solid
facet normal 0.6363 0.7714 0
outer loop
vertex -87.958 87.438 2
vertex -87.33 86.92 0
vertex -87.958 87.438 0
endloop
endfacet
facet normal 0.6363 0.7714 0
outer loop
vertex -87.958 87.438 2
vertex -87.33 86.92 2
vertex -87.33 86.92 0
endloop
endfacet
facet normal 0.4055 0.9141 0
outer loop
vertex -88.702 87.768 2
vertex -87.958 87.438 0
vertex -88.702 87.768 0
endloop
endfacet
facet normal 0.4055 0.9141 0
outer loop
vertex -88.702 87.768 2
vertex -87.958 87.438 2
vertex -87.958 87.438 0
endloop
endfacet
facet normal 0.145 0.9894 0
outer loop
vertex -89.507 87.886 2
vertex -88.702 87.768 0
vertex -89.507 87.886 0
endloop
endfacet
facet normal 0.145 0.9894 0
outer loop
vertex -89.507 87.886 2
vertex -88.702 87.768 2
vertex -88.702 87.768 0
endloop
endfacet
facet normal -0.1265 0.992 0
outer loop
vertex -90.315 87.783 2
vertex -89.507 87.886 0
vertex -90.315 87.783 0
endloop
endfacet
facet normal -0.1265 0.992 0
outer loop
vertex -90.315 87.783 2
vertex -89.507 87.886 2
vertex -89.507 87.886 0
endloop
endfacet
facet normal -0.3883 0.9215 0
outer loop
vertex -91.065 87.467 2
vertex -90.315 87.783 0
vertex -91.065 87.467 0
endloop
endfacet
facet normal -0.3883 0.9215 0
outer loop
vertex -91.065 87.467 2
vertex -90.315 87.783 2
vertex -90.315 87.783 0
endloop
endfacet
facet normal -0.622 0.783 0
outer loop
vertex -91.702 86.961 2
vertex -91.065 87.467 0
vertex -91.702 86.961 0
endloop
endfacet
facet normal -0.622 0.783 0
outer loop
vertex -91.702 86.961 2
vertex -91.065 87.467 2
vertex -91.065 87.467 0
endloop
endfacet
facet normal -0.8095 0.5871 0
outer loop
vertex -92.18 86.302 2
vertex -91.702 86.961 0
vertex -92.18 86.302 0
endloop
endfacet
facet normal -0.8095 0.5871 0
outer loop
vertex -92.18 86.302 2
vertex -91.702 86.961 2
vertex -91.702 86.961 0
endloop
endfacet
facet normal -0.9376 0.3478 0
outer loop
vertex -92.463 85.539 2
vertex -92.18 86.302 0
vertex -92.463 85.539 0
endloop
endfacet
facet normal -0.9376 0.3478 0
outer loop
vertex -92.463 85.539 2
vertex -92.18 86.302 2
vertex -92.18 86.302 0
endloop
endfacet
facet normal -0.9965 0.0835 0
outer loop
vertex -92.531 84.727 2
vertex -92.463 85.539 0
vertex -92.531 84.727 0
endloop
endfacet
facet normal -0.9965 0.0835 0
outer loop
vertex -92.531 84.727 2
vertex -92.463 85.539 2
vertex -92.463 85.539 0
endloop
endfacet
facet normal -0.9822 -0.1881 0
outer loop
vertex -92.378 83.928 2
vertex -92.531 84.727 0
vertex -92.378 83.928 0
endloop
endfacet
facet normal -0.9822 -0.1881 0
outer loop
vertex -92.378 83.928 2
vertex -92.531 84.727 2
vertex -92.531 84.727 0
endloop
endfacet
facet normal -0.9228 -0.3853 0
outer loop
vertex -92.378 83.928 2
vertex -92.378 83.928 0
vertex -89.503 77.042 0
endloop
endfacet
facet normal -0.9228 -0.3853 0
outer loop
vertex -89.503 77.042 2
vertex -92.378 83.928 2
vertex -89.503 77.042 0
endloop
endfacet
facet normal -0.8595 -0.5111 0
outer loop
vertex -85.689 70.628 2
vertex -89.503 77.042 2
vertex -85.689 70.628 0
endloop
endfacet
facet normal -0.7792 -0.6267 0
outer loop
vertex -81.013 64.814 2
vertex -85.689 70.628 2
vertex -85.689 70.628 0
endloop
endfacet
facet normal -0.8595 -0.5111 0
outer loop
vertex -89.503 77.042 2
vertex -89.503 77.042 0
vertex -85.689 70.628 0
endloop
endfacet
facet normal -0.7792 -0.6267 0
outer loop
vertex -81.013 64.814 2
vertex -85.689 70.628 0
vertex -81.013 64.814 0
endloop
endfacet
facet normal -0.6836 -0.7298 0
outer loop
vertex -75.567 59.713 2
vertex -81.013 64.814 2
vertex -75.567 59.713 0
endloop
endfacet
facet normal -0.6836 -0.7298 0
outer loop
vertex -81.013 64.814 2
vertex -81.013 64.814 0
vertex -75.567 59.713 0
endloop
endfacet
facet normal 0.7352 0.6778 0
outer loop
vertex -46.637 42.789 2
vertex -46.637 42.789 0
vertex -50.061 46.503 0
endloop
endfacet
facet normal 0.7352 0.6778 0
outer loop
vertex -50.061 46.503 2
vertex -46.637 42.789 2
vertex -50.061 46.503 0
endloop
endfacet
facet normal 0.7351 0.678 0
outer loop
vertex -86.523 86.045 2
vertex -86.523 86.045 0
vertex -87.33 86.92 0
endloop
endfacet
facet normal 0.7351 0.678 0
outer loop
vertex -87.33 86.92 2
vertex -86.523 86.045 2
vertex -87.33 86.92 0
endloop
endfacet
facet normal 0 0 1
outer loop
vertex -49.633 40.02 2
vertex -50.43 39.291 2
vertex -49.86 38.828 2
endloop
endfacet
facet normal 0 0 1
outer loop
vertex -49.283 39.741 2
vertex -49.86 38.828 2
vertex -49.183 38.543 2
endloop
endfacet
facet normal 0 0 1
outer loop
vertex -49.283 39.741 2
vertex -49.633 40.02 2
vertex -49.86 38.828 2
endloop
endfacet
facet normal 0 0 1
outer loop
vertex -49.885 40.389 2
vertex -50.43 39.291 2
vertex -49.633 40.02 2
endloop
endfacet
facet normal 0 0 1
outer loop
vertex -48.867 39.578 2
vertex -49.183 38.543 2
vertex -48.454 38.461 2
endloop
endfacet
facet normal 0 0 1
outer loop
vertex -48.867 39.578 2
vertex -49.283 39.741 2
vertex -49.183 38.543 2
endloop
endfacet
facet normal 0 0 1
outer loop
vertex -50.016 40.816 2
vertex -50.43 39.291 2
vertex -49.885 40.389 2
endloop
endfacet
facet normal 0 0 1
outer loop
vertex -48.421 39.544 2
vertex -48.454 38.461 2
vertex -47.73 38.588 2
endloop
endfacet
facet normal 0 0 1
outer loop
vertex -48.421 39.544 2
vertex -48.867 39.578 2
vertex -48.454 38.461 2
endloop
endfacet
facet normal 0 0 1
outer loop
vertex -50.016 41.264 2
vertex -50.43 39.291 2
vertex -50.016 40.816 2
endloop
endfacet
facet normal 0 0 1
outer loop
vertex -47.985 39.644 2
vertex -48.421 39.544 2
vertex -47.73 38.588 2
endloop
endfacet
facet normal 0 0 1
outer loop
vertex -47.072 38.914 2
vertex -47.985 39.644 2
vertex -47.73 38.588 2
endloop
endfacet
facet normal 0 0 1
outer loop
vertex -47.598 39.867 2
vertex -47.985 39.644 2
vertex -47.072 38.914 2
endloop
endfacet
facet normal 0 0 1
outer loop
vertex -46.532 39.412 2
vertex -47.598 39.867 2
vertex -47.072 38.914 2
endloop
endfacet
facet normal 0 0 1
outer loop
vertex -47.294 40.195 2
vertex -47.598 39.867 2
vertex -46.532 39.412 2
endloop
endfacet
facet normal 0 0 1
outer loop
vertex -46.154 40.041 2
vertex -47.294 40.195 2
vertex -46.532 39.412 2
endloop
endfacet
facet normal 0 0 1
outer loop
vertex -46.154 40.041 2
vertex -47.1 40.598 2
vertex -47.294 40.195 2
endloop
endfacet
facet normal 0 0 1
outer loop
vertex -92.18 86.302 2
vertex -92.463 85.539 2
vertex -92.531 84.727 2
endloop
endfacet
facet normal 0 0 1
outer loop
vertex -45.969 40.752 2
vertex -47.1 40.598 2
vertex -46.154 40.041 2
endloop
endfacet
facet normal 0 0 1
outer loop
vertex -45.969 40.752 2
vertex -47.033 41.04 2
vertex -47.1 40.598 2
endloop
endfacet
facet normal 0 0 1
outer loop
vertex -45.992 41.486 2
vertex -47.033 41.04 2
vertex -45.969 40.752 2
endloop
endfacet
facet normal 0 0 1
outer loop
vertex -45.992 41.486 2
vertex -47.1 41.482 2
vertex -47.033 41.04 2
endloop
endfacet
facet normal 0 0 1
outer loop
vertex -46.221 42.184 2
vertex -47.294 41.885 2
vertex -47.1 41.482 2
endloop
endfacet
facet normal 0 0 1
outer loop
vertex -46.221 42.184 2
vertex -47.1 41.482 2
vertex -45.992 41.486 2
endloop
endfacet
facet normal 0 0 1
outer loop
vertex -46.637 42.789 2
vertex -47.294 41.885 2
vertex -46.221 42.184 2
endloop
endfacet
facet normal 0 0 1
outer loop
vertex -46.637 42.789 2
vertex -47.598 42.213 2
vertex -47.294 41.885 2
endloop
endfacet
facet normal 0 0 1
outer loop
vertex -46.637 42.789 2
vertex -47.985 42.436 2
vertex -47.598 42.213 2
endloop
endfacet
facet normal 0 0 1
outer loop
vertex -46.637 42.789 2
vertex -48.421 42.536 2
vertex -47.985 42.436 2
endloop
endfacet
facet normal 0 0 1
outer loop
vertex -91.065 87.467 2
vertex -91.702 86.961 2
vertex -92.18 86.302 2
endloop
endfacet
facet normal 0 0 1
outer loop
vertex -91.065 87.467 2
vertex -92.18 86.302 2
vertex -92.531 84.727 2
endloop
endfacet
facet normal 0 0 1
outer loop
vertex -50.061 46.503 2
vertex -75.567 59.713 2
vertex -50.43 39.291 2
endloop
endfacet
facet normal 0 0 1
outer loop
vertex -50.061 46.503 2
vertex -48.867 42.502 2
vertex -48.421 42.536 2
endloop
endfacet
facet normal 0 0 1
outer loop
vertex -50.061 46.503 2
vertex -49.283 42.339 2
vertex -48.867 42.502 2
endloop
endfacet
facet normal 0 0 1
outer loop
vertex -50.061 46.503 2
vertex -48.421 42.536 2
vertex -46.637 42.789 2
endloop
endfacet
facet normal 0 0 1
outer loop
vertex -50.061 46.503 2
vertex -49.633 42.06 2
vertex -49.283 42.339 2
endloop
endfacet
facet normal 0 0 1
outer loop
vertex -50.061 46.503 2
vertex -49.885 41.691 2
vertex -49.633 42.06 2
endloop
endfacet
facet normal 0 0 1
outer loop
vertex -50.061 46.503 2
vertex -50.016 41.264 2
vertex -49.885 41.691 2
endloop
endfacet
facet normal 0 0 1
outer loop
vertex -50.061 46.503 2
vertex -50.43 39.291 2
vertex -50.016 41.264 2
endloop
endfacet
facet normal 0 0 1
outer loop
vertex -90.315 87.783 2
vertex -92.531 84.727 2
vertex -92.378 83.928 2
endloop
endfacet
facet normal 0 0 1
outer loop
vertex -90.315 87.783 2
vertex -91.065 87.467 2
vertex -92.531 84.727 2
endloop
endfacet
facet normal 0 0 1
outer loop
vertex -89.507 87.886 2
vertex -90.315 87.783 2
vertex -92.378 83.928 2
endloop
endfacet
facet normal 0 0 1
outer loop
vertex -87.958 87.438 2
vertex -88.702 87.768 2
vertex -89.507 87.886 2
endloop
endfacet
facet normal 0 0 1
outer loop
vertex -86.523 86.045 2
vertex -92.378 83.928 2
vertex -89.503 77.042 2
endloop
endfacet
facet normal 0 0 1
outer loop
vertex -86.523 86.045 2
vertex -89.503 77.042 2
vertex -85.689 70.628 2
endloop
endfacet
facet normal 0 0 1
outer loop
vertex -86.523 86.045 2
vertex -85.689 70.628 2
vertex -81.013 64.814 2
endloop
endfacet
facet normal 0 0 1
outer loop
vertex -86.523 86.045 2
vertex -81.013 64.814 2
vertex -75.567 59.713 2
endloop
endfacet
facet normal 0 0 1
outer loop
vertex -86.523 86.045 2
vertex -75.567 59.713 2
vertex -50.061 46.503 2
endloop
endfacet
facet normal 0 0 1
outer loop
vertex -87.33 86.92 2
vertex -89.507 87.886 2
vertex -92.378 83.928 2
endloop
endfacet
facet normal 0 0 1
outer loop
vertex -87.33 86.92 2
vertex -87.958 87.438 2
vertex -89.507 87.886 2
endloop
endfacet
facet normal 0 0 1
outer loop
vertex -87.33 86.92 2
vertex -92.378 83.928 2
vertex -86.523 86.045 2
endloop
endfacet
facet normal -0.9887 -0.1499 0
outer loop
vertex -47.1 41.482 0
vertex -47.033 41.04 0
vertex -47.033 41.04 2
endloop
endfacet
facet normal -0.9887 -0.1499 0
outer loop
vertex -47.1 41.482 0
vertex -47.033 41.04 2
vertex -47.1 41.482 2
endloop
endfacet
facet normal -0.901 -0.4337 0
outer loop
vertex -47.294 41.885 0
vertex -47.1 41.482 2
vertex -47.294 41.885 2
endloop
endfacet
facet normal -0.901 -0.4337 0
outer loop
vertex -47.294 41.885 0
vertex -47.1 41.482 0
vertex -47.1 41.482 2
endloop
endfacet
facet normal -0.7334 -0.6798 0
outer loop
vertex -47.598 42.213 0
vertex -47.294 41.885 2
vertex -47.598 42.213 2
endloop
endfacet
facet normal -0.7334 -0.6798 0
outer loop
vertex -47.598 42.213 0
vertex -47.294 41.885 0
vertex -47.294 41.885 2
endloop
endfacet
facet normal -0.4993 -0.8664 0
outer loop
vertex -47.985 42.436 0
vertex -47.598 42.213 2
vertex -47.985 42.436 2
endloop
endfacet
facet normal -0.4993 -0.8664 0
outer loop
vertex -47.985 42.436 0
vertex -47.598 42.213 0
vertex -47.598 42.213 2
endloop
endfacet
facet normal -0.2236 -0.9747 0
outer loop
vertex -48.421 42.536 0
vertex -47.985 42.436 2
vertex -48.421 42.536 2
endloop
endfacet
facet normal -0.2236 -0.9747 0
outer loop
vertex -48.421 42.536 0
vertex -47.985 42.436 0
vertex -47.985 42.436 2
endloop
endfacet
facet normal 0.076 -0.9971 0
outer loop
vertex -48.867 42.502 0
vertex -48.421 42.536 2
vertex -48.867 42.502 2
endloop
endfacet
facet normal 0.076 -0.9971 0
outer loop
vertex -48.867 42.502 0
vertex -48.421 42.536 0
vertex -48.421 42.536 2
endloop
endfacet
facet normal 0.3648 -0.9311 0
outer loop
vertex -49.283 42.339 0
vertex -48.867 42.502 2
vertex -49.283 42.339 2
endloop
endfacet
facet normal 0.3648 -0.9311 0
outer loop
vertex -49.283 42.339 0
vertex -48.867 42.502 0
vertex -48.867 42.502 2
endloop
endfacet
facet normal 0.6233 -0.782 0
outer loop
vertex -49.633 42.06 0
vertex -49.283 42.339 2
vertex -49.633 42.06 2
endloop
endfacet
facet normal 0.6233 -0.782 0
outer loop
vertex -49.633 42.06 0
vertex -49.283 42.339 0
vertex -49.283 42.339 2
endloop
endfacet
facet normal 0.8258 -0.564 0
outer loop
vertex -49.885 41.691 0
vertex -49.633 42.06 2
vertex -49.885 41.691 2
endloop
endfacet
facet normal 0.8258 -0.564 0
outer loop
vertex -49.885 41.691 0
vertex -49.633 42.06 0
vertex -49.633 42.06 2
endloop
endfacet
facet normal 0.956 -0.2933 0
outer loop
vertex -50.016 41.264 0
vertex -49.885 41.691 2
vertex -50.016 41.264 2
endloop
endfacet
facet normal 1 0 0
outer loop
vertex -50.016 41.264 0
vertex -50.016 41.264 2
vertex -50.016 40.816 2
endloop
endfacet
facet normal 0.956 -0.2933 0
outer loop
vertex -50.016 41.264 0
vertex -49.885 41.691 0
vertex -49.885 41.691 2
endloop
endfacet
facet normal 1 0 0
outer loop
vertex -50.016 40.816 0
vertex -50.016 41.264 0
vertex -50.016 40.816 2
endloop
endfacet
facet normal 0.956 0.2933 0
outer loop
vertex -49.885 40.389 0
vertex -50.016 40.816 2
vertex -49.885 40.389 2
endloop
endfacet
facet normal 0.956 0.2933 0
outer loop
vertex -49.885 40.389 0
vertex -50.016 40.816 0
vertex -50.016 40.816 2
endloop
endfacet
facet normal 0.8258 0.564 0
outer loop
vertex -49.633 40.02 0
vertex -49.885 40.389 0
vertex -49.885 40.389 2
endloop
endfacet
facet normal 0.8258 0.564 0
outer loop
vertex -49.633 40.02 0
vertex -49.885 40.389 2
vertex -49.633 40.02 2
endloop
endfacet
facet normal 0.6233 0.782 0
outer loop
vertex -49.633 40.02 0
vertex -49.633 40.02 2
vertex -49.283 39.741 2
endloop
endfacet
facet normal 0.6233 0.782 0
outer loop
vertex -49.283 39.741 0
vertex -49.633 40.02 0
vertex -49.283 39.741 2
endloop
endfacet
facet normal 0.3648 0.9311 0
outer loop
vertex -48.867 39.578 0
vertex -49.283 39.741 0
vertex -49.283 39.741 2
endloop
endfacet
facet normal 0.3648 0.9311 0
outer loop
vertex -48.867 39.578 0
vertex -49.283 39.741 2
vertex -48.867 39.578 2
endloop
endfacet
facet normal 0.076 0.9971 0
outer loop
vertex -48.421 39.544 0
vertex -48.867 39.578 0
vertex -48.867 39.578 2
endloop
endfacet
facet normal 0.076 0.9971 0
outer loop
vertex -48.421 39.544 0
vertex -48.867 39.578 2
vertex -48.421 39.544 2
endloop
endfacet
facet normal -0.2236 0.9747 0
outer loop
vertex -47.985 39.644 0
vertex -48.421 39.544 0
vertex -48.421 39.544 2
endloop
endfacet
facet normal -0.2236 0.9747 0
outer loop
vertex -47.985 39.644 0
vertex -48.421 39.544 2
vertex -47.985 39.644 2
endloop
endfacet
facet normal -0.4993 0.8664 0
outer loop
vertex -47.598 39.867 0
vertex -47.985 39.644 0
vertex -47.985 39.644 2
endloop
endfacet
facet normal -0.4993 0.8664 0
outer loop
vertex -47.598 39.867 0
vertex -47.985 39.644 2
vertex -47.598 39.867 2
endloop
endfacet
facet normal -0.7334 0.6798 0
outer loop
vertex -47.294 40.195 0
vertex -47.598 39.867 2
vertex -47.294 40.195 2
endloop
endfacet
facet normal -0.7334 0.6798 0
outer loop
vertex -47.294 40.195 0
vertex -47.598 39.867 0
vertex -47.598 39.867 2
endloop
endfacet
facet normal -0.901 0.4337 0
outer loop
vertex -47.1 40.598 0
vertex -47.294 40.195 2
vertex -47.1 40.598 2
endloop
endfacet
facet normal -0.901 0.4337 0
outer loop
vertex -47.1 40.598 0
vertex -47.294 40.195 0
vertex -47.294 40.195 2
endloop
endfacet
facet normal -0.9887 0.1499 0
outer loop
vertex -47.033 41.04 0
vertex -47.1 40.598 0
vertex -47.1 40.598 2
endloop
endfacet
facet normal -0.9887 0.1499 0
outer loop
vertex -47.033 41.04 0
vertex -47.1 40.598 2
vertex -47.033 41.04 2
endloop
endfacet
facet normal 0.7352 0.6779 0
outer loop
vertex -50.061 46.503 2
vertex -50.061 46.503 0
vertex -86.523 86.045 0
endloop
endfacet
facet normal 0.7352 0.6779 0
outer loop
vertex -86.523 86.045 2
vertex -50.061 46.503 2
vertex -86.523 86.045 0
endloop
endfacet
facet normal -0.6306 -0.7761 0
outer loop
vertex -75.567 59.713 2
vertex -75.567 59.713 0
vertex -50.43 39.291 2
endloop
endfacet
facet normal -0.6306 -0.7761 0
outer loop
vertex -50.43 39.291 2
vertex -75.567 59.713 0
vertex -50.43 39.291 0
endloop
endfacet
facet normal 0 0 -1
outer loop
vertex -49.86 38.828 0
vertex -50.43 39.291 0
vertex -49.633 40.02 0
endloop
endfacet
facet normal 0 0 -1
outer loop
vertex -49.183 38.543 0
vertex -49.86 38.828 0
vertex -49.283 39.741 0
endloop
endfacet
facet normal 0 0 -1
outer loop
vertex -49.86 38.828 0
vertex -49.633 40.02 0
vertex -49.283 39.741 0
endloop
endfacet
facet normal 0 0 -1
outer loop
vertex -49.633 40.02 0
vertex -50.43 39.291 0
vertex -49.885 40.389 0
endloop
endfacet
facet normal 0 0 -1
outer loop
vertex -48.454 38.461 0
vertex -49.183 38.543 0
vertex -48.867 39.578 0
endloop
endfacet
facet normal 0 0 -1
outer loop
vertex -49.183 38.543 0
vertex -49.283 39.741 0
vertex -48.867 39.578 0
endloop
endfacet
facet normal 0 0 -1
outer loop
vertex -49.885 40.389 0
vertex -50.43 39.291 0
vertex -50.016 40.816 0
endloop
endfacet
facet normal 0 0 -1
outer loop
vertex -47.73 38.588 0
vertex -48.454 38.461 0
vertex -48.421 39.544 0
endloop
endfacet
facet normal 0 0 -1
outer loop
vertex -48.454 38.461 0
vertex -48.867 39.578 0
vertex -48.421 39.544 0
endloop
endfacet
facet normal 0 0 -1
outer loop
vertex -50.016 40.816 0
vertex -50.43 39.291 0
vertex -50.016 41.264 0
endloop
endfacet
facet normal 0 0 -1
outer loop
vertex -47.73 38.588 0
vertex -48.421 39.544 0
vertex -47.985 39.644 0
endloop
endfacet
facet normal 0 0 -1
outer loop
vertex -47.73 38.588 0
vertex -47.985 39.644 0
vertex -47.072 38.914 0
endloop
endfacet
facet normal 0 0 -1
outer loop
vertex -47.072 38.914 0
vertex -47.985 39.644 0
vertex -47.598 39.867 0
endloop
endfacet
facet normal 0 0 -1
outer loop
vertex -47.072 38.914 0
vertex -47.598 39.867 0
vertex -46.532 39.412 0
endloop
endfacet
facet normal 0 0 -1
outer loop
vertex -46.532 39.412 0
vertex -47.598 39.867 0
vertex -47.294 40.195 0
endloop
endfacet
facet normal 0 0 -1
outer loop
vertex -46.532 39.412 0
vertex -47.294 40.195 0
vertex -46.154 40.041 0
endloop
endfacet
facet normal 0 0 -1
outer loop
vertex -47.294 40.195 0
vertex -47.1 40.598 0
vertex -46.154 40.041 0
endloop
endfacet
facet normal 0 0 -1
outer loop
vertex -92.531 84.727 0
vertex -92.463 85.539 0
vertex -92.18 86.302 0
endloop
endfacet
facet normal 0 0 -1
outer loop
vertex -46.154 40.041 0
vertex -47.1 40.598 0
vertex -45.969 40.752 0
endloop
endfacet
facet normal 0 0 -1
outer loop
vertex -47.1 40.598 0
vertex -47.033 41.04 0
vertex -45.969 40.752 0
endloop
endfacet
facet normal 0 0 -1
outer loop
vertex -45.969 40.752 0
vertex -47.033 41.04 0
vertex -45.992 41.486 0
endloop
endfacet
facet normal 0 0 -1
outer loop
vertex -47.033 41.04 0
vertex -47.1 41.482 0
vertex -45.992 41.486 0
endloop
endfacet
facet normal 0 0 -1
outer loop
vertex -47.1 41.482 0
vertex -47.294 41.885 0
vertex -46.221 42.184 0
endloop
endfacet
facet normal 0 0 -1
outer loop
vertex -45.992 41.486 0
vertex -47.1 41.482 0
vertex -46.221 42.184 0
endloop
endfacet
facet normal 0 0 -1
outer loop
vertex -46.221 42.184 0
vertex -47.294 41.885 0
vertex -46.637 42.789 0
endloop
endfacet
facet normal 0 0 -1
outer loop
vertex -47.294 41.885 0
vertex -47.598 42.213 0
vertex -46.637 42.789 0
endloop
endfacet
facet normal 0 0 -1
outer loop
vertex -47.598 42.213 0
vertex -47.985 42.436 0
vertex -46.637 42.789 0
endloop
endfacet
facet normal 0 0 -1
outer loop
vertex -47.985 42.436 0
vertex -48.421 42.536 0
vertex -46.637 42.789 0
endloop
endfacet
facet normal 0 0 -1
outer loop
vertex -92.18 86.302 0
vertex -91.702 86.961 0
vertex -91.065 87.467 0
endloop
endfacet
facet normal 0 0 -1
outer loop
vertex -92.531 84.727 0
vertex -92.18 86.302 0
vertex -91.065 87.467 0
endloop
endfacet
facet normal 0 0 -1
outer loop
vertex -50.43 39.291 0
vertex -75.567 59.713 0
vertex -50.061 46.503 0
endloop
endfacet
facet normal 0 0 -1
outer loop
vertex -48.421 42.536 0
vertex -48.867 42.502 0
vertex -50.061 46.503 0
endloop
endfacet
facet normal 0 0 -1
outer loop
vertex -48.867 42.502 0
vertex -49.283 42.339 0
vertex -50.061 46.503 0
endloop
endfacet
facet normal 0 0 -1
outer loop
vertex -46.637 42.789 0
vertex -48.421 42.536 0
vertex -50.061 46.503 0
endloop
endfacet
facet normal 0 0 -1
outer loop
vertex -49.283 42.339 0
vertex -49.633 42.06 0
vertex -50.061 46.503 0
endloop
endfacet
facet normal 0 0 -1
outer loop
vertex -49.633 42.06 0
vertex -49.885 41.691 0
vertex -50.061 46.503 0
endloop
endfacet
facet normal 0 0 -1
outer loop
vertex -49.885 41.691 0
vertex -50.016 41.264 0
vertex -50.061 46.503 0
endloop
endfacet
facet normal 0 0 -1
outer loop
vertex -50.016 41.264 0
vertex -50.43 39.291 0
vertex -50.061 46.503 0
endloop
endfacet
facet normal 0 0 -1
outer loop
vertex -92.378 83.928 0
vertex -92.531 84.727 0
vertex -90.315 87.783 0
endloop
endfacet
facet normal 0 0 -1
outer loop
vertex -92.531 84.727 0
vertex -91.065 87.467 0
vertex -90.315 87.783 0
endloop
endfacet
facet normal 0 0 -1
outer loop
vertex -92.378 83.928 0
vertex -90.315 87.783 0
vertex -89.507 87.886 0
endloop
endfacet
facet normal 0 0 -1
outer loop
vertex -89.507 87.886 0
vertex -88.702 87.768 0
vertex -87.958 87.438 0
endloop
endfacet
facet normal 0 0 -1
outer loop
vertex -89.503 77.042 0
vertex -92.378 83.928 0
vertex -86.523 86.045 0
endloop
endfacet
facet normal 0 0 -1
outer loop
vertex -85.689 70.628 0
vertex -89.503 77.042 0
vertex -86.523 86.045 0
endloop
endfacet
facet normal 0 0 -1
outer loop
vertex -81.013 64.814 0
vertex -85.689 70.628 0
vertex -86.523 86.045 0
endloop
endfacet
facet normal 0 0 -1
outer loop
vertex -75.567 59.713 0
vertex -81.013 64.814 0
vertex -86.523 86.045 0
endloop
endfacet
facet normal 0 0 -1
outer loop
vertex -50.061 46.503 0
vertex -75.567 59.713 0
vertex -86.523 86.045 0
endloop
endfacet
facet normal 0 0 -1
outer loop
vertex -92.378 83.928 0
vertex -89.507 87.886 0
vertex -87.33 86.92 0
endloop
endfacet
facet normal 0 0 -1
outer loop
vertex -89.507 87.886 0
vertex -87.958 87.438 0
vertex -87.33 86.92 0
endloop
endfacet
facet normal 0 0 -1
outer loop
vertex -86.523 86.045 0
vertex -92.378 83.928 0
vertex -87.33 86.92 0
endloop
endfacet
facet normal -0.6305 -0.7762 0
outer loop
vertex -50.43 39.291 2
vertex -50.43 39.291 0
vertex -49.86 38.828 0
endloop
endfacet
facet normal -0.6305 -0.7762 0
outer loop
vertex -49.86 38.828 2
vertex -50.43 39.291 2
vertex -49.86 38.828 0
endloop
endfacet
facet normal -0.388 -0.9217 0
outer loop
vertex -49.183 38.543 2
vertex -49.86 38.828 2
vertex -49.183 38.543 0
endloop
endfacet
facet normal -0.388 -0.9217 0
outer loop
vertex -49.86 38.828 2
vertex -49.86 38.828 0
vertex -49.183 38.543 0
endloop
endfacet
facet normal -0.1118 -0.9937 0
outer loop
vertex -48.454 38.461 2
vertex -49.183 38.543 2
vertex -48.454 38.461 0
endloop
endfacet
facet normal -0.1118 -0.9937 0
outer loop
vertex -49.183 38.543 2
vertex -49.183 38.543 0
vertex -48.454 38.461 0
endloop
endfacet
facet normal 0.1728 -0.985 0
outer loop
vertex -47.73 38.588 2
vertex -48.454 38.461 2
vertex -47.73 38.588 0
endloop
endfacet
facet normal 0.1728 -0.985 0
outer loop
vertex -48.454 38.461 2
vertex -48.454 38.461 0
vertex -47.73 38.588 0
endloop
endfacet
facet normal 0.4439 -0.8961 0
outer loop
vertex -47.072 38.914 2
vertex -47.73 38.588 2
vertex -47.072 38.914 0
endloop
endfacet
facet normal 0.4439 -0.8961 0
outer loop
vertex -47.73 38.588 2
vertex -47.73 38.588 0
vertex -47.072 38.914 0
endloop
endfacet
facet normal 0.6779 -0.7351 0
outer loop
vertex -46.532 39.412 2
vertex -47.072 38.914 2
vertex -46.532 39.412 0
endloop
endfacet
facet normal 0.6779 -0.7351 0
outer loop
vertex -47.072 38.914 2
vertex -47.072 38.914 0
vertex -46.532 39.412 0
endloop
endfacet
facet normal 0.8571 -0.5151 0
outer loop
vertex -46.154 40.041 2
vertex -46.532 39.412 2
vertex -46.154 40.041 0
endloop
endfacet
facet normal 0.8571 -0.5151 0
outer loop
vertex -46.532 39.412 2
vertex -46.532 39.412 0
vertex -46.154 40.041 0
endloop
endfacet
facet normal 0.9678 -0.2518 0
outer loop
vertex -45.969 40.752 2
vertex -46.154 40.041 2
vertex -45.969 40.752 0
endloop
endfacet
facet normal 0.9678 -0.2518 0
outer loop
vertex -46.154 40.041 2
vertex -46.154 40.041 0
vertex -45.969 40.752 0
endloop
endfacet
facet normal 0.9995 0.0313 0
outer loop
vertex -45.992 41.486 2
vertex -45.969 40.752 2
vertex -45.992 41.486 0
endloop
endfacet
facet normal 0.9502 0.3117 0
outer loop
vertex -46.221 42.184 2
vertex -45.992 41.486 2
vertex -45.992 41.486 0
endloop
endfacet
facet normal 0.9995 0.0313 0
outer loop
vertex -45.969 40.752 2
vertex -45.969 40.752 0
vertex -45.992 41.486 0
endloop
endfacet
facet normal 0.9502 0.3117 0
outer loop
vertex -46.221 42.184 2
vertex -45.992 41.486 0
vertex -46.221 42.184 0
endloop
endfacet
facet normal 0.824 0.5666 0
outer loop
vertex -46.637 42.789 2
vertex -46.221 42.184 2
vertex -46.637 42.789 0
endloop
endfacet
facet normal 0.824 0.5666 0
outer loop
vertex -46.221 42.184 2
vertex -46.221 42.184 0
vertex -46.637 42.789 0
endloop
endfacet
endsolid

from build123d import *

# Parameters (mm, degrees)
SKETCH1_R           = 1.5
BOSS_EXTRUDE1_DEPTH = 2
FILLET1_R           = 3


with BuildPart() as part:
    # Sketch1 → Boss-Extrude1 (new body)
    with BuildSketch(Plane.XY):
        with BuildLine():
            Line((-46.636509162, 42.789020236), (-50.060973508, 46.502785938))
            Line((-50.060973508, 46.502785938), (-86.522855439, 86.04499543))
            Line((-86.522855439, 86.04499543), (-94.837872086, 95.062471017))
            ThreePointArc((-94.837872086, 95.062471017), (-88.687933444, 75.487292789), (-75.566721617, 59.712529776))
            Line((-75.566721617, 59.712529776), (-50.429932547, 39.291103519))
            ThreePointArc((-50.429932547, 39.291103519), (-46.784262496, 39.143350184), (-46.636509162, 42.789020236))
        make_face()
        with Locations((-48.533220855, 41.040061877)):
            Circle(SKETCH1_R, mode=Mode.SUBTRACT)
    extrude(amount=BOSS_EXTRUDE1_DEPTH)

    # Fillet1
    fillet1_edges = [part.edges().sort_by_distance(p)[0] for p in [
        (-94.837872086, 95.062471017, 1),
    ]]
    fillet(fillet1_edges, radius=FILLET1_R)


solid = part.part
